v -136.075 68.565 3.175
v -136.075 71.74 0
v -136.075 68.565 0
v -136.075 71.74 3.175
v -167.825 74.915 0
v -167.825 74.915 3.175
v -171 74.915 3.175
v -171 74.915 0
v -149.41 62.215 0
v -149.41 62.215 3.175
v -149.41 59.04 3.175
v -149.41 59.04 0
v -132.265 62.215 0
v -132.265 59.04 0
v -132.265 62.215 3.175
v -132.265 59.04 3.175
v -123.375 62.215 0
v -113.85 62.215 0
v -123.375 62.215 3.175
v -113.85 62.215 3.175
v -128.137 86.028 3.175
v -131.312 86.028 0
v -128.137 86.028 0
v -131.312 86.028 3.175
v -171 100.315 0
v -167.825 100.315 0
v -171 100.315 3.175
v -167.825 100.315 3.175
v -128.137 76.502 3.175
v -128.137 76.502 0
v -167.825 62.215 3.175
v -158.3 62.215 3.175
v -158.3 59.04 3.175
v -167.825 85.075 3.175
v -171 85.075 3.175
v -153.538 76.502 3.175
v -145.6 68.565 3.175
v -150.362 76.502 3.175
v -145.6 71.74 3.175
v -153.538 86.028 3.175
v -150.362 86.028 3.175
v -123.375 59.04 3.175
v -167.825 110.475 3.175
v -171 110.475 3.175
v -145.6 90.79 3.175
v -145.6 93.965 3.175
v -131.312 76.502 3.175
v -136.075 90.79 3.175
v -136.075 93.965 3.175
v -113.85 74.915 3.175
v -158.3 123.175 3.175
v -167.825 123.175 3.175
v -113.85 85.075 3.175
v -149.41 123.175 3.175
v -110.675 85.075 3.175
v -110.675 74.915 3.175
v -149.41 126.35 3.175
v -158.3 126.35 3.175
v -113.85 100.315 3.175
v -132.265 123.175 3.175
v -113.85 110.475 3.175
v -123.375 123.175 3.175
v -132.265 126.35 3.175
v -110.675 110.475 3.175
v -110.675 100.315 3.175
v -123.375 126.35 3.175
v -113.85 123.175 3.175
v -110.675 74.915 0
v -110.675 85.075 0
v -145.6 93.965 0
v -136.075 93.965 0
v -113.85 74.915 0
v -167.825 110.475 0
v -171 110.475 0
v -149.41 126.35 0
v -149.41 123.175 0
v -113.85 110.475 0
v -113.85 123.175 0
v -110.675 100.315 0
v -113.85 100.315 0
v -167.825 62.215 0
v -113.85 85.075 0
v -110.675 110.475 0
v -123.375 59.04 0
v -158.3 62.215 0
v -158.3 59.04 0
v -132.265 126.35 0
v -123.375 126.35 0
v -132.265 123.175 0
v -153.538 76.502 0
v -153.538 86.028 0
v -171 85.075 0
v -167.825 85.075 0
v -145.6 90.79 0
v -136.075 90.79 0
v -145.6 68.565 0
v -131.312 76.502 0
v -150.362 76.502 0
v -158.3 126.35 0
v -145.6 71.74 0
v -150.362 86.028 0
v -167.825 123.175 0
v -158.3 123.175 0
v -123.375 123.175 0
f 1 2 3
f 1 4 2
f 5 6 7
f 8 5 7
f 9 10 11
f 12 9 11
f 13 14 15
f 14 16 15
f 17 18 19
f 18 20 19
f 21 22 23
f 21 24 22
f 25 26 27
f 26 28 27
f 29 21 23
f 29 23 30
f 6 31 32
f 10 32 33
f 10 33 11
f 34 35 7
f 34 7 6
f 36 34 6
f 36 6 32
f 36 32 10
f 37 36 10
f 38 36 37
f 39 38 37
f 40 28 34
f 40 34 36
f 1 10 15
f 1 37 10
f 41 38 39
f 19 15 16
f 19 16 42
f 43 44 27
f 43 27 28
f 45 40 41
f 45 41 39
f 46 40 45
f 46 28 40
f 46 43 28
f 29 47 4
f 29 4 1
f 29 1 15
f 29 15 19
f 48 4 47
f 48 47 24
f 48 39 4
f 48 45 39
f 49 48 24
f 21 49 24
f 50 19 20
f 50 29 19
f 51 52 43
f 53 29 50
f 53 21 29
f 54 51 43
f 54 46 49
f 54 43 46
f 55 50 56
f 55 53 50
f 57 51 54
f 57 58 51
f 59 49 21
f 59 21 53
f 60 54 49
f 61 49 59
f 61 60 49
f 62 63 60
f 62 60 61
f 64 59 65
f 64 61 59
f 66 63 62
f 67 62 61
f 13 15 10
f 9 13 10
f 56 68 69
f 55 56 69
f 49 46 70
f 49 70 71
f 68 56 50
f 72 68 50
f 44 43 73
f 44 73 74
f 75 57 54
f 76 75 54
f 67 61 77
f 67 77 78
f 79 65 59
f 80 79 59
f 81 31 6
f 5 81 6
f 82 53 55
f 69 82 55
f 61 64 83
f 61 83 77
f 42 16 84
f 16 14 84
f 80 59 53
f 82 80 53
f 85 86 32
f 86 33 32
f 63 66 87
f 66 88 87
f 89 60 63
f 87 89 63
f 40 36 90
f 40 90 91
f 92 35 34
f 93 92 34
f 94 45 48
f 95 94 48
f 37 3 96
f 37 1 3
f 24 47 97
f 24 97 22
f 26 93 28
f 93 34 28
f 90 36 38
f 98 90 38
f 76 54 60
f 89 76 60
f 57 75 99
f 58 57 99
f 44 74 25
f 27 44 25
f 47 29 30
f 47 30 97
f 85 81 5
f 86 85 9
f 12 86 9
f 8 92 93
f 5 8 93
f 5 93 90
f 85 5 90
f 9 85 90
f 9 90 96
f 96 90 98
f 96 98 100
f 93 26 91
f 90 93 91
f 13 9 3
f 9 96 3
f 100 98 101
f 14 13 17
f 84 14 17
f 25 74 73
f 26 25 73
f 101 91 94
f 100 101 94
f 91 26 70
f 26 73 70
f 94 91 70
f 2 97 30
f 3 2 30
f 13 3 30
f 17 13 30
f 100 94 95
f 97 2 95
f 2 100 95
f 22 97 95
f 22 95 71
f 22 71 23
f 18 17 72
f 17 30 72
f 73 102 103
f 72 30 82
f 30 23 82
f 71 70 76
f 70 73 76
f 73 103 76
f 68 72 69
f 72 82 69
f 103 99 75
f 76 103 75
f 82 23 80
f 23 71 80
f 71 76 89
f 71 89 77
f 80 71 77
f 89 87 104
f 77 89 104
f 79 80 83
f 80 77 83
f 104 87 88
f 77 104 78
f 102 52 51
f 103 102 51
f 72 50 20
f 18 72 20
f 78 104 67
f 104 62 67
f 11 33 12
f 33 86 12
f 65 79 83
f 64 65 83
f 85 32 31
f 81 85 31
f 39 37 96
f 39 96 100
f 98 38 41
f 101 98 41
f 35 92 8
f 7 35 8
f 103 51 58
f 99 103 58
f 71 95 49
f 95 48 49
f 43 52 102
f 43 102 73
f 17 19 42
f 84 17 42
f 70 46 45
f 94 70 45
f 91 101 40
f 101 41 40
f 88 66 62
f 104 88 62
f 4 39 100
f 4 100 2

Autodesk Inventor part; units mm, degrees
ref_plane "YZ Plane" through (0, 0, 0) normal (1, 0, 0) x (0, 1, 0)
ref_plane "XZ Plane" through (0, 0, 0) normal (0, 1, 0) x (-1, 0, 0)
ref_plane "XY Plane" through (0, 0, 0) normal (0, 0, 1) x (1, 0, 0)
sketch "Sketch1" plane through (0, 0, 0) normal (0, 0, 1) x (1, 0, 0)
  line L0 (-110.675, 126.35) -> (-171, 126.35)
  line L1 (-171, 126.35) -> (-171, 59.04)
  line L2 (-171, 59.04) -> (-110.675, 59.04)
  line L3 (-110.675, 59.04) -> (-110.675, 126.35)
  point P0 (0, 0)
  dimension "d0" = 60.325
  dimension "d1" = 67.31
extrude "Extrusion1" add sketch "Sketch1" along normal blind 3.175
sketch "Sketch2" plane through (0, 0, 3.175) normal (0, 0, 1) x (1, 0, 0)
  line L0 (-171, 126.35) -> (-171, 59.04) projected
  line L1 (-171, 59.04) -> (-167.825, 59.04)
  line L2 (-167.825, 59.04) -> (-167.825, 74.915)
  line L3 (-167.825, 74.915) -> (-171, 74.915)
  line L4 (-171, 74.915) -> (-171, 59.04)
  line L5 (-171, 85.075) -> (-167.825, 85.075)
  line L6 (-167.825, 85.075) -> (-167.825, 100.315)
  line L7 (-167.825, 100.315) -> (-171, 100.315)
  line L8 (-171, 100.315) -> (-171, 85.075)
  line L9 (-110.675, 126.35) -> (-171, 126.35) projected
  line L10 (-171, 126.35) -> (-167.825, 126.35)
  line L11 (-167.825, 126.35) -> (-167.825, 110.475)
  line L12 (-167.825, 110.475) -> (-171, 110.475)
  line L13 (-171, 110.475) -> (-171, 126.35)
  point P0 (0, 0)
  dimension "d4" = 3.175
  dimension "d5" = 15.875
  dimension "d6" = 10.16
  dimension "d7" = 15.875
  dimension "d8" = 10.16
extrude "Extrusion3" cut sketch "Sketch2" against normal blind 3.175
ref_plane "Work Plane1" through (-140.8375, 59.04, 0) normal (1, 0, 0) x (0, 0, -1)
mirror "Mirror1" about plane through (-140.8375, 59.04, 0) normal (1, 0, 0) of "Extrusion3"
sketch "Sketch3" plane through (0, 0, 3.175) normal (0, 0, 1) x (1, 0, 0)
  line L0 (-123.375, 59.04) -> (-110.675, 59.04)
  line L1 (-110.675, 59.04) -> (-110.675, 62.215)
  line L2 (-110.675, 62.215) -> (-123.375, 62.215)
  line L3 (-123.375, 62.215) -> (-123.375, 59.04)
  line L4 (-167.825, 59.04) -> (-113.85, 59.04) projected
  line L5 (-110.675, 74.915) -> (-110.675, 85.075) projected
  line L6 (-140.8375, 59.04) -> (-132.265, 59.04)
  line L7 (-132.265, 59.04) -> (-132.265, 62.215)
  line L8 (-132.265, 62.215) -> (-140.8375, 62.215)
  line L9 (-140.8375, 62.215) -> (-140.8375, 59.04)
  point P0 (0, 0)
  dimension "d13" = 12.7
  dimension "d14" = 3.175
  dimension "d15" = 8.89
extrude "Extrusion4" cut sketch "Sketch3" against normal blind 3.175
mirror "Mirror2" about plane through (-140.8375, 59.04, 0) normal (1, 0, 0) of "Extrusion4"
ref_plane "Work Plane2" through (-158.3, 92.695, 0) normal (0, -1, 0) x (1, 0, 0)
mirror "Mirror3" about plane through (-158.3, 92.695, 0) normal (0, -1, 0) of "Extrusion4", "Mirror2"
sketch "Sketch4" plane through (0, 0, 3.175) normal (0, 0, 1) x (1, 0, 0)
  line L0 (-128.1375, 68.565) -> (-153.5375, 68.565)
  line L1 (-153.5375, 68.565) -> (-153.5375, 93.965)
  line L2 (-153.5375, 93.965) -> (-128.1375, 93.965)
  line L3 (-128.1375, 93.965) -> (-128.1375, 68.565)
  line L4 (-149.41, 62.215) -> (-132.265, 62.215) projected
  line L5 (-140.8375, 151.62) -> (-140.8375, -25.27) projected
  line L6 (-136.075, 93.965) -> (-145.6, 93.965)
  line L7 (-145.6, 93.965) -> (-145.6, 90.79)
  line L8 (-145.6, 90.79) -> (-136.075, 90.79)
  line L9 (-136.075, 90.79) -> (-136.075, 93.965)
  line L10 (-136.075, 68.565) -> (-145.6, 68.565)
  line L11 (-145.6, 68.565) -> (-145.6, 71.74)
  line L12 (-145.6, 71.74) -> (-136.075, 71.74)
  line L13 (-136.075, 71.74) -> (-136.075, 68.565)
  line L14 (-128.1375, 76.5025) -> (-131.3125, 76.5025)
  line L15 (-131.3125, 76.5025) -> (-131.3125, 86.0275)
  line L16 (-131.3125, 86.0275) -> (-128.1375, 86.0275)
  line L17 (-128.1375, 86.0275) -> (-128.1375, 76.5025)
  line L18 (-153.5375, 76.5025) -> (-150.3625, 76.5025)
  line L19 (-150.3625, 76.5025) -> (-150.3625, 86.0275)
  line L20 (-150.3625, 86.0275) -> (-153.5375, 86.0275)
  line L21 (-153.5375, 86.0275) -> (-153.5375, 76.5025)
  point P0 (0, 0)
  dimension "d18" = 6.35
  dimension "d19" = 12.7
  dimension "d20" = 25.4
  dimension "d21" = 25.4
  dimension "d22" = 7.9375
  dimension "d23" = 7.9375
  dimension "d24" = 3.175
  dimension "d25" = 3.175
  dimension "d26" = 7.9375
  dimension "d27" = 7.9375
  dimension "d28" = 3.175
  dimension "d29" = 3.175
extrude "Extrusion5" cut sketch "Sketch4" against normal blind 3.175 contours L0 L5 L12 L13 | L14 L15 L16 L3 | L0 L11 L12 L5 | L8 L7 L2 L5 | L5 L2 L9 L8 | L1 L20 L19 L18
